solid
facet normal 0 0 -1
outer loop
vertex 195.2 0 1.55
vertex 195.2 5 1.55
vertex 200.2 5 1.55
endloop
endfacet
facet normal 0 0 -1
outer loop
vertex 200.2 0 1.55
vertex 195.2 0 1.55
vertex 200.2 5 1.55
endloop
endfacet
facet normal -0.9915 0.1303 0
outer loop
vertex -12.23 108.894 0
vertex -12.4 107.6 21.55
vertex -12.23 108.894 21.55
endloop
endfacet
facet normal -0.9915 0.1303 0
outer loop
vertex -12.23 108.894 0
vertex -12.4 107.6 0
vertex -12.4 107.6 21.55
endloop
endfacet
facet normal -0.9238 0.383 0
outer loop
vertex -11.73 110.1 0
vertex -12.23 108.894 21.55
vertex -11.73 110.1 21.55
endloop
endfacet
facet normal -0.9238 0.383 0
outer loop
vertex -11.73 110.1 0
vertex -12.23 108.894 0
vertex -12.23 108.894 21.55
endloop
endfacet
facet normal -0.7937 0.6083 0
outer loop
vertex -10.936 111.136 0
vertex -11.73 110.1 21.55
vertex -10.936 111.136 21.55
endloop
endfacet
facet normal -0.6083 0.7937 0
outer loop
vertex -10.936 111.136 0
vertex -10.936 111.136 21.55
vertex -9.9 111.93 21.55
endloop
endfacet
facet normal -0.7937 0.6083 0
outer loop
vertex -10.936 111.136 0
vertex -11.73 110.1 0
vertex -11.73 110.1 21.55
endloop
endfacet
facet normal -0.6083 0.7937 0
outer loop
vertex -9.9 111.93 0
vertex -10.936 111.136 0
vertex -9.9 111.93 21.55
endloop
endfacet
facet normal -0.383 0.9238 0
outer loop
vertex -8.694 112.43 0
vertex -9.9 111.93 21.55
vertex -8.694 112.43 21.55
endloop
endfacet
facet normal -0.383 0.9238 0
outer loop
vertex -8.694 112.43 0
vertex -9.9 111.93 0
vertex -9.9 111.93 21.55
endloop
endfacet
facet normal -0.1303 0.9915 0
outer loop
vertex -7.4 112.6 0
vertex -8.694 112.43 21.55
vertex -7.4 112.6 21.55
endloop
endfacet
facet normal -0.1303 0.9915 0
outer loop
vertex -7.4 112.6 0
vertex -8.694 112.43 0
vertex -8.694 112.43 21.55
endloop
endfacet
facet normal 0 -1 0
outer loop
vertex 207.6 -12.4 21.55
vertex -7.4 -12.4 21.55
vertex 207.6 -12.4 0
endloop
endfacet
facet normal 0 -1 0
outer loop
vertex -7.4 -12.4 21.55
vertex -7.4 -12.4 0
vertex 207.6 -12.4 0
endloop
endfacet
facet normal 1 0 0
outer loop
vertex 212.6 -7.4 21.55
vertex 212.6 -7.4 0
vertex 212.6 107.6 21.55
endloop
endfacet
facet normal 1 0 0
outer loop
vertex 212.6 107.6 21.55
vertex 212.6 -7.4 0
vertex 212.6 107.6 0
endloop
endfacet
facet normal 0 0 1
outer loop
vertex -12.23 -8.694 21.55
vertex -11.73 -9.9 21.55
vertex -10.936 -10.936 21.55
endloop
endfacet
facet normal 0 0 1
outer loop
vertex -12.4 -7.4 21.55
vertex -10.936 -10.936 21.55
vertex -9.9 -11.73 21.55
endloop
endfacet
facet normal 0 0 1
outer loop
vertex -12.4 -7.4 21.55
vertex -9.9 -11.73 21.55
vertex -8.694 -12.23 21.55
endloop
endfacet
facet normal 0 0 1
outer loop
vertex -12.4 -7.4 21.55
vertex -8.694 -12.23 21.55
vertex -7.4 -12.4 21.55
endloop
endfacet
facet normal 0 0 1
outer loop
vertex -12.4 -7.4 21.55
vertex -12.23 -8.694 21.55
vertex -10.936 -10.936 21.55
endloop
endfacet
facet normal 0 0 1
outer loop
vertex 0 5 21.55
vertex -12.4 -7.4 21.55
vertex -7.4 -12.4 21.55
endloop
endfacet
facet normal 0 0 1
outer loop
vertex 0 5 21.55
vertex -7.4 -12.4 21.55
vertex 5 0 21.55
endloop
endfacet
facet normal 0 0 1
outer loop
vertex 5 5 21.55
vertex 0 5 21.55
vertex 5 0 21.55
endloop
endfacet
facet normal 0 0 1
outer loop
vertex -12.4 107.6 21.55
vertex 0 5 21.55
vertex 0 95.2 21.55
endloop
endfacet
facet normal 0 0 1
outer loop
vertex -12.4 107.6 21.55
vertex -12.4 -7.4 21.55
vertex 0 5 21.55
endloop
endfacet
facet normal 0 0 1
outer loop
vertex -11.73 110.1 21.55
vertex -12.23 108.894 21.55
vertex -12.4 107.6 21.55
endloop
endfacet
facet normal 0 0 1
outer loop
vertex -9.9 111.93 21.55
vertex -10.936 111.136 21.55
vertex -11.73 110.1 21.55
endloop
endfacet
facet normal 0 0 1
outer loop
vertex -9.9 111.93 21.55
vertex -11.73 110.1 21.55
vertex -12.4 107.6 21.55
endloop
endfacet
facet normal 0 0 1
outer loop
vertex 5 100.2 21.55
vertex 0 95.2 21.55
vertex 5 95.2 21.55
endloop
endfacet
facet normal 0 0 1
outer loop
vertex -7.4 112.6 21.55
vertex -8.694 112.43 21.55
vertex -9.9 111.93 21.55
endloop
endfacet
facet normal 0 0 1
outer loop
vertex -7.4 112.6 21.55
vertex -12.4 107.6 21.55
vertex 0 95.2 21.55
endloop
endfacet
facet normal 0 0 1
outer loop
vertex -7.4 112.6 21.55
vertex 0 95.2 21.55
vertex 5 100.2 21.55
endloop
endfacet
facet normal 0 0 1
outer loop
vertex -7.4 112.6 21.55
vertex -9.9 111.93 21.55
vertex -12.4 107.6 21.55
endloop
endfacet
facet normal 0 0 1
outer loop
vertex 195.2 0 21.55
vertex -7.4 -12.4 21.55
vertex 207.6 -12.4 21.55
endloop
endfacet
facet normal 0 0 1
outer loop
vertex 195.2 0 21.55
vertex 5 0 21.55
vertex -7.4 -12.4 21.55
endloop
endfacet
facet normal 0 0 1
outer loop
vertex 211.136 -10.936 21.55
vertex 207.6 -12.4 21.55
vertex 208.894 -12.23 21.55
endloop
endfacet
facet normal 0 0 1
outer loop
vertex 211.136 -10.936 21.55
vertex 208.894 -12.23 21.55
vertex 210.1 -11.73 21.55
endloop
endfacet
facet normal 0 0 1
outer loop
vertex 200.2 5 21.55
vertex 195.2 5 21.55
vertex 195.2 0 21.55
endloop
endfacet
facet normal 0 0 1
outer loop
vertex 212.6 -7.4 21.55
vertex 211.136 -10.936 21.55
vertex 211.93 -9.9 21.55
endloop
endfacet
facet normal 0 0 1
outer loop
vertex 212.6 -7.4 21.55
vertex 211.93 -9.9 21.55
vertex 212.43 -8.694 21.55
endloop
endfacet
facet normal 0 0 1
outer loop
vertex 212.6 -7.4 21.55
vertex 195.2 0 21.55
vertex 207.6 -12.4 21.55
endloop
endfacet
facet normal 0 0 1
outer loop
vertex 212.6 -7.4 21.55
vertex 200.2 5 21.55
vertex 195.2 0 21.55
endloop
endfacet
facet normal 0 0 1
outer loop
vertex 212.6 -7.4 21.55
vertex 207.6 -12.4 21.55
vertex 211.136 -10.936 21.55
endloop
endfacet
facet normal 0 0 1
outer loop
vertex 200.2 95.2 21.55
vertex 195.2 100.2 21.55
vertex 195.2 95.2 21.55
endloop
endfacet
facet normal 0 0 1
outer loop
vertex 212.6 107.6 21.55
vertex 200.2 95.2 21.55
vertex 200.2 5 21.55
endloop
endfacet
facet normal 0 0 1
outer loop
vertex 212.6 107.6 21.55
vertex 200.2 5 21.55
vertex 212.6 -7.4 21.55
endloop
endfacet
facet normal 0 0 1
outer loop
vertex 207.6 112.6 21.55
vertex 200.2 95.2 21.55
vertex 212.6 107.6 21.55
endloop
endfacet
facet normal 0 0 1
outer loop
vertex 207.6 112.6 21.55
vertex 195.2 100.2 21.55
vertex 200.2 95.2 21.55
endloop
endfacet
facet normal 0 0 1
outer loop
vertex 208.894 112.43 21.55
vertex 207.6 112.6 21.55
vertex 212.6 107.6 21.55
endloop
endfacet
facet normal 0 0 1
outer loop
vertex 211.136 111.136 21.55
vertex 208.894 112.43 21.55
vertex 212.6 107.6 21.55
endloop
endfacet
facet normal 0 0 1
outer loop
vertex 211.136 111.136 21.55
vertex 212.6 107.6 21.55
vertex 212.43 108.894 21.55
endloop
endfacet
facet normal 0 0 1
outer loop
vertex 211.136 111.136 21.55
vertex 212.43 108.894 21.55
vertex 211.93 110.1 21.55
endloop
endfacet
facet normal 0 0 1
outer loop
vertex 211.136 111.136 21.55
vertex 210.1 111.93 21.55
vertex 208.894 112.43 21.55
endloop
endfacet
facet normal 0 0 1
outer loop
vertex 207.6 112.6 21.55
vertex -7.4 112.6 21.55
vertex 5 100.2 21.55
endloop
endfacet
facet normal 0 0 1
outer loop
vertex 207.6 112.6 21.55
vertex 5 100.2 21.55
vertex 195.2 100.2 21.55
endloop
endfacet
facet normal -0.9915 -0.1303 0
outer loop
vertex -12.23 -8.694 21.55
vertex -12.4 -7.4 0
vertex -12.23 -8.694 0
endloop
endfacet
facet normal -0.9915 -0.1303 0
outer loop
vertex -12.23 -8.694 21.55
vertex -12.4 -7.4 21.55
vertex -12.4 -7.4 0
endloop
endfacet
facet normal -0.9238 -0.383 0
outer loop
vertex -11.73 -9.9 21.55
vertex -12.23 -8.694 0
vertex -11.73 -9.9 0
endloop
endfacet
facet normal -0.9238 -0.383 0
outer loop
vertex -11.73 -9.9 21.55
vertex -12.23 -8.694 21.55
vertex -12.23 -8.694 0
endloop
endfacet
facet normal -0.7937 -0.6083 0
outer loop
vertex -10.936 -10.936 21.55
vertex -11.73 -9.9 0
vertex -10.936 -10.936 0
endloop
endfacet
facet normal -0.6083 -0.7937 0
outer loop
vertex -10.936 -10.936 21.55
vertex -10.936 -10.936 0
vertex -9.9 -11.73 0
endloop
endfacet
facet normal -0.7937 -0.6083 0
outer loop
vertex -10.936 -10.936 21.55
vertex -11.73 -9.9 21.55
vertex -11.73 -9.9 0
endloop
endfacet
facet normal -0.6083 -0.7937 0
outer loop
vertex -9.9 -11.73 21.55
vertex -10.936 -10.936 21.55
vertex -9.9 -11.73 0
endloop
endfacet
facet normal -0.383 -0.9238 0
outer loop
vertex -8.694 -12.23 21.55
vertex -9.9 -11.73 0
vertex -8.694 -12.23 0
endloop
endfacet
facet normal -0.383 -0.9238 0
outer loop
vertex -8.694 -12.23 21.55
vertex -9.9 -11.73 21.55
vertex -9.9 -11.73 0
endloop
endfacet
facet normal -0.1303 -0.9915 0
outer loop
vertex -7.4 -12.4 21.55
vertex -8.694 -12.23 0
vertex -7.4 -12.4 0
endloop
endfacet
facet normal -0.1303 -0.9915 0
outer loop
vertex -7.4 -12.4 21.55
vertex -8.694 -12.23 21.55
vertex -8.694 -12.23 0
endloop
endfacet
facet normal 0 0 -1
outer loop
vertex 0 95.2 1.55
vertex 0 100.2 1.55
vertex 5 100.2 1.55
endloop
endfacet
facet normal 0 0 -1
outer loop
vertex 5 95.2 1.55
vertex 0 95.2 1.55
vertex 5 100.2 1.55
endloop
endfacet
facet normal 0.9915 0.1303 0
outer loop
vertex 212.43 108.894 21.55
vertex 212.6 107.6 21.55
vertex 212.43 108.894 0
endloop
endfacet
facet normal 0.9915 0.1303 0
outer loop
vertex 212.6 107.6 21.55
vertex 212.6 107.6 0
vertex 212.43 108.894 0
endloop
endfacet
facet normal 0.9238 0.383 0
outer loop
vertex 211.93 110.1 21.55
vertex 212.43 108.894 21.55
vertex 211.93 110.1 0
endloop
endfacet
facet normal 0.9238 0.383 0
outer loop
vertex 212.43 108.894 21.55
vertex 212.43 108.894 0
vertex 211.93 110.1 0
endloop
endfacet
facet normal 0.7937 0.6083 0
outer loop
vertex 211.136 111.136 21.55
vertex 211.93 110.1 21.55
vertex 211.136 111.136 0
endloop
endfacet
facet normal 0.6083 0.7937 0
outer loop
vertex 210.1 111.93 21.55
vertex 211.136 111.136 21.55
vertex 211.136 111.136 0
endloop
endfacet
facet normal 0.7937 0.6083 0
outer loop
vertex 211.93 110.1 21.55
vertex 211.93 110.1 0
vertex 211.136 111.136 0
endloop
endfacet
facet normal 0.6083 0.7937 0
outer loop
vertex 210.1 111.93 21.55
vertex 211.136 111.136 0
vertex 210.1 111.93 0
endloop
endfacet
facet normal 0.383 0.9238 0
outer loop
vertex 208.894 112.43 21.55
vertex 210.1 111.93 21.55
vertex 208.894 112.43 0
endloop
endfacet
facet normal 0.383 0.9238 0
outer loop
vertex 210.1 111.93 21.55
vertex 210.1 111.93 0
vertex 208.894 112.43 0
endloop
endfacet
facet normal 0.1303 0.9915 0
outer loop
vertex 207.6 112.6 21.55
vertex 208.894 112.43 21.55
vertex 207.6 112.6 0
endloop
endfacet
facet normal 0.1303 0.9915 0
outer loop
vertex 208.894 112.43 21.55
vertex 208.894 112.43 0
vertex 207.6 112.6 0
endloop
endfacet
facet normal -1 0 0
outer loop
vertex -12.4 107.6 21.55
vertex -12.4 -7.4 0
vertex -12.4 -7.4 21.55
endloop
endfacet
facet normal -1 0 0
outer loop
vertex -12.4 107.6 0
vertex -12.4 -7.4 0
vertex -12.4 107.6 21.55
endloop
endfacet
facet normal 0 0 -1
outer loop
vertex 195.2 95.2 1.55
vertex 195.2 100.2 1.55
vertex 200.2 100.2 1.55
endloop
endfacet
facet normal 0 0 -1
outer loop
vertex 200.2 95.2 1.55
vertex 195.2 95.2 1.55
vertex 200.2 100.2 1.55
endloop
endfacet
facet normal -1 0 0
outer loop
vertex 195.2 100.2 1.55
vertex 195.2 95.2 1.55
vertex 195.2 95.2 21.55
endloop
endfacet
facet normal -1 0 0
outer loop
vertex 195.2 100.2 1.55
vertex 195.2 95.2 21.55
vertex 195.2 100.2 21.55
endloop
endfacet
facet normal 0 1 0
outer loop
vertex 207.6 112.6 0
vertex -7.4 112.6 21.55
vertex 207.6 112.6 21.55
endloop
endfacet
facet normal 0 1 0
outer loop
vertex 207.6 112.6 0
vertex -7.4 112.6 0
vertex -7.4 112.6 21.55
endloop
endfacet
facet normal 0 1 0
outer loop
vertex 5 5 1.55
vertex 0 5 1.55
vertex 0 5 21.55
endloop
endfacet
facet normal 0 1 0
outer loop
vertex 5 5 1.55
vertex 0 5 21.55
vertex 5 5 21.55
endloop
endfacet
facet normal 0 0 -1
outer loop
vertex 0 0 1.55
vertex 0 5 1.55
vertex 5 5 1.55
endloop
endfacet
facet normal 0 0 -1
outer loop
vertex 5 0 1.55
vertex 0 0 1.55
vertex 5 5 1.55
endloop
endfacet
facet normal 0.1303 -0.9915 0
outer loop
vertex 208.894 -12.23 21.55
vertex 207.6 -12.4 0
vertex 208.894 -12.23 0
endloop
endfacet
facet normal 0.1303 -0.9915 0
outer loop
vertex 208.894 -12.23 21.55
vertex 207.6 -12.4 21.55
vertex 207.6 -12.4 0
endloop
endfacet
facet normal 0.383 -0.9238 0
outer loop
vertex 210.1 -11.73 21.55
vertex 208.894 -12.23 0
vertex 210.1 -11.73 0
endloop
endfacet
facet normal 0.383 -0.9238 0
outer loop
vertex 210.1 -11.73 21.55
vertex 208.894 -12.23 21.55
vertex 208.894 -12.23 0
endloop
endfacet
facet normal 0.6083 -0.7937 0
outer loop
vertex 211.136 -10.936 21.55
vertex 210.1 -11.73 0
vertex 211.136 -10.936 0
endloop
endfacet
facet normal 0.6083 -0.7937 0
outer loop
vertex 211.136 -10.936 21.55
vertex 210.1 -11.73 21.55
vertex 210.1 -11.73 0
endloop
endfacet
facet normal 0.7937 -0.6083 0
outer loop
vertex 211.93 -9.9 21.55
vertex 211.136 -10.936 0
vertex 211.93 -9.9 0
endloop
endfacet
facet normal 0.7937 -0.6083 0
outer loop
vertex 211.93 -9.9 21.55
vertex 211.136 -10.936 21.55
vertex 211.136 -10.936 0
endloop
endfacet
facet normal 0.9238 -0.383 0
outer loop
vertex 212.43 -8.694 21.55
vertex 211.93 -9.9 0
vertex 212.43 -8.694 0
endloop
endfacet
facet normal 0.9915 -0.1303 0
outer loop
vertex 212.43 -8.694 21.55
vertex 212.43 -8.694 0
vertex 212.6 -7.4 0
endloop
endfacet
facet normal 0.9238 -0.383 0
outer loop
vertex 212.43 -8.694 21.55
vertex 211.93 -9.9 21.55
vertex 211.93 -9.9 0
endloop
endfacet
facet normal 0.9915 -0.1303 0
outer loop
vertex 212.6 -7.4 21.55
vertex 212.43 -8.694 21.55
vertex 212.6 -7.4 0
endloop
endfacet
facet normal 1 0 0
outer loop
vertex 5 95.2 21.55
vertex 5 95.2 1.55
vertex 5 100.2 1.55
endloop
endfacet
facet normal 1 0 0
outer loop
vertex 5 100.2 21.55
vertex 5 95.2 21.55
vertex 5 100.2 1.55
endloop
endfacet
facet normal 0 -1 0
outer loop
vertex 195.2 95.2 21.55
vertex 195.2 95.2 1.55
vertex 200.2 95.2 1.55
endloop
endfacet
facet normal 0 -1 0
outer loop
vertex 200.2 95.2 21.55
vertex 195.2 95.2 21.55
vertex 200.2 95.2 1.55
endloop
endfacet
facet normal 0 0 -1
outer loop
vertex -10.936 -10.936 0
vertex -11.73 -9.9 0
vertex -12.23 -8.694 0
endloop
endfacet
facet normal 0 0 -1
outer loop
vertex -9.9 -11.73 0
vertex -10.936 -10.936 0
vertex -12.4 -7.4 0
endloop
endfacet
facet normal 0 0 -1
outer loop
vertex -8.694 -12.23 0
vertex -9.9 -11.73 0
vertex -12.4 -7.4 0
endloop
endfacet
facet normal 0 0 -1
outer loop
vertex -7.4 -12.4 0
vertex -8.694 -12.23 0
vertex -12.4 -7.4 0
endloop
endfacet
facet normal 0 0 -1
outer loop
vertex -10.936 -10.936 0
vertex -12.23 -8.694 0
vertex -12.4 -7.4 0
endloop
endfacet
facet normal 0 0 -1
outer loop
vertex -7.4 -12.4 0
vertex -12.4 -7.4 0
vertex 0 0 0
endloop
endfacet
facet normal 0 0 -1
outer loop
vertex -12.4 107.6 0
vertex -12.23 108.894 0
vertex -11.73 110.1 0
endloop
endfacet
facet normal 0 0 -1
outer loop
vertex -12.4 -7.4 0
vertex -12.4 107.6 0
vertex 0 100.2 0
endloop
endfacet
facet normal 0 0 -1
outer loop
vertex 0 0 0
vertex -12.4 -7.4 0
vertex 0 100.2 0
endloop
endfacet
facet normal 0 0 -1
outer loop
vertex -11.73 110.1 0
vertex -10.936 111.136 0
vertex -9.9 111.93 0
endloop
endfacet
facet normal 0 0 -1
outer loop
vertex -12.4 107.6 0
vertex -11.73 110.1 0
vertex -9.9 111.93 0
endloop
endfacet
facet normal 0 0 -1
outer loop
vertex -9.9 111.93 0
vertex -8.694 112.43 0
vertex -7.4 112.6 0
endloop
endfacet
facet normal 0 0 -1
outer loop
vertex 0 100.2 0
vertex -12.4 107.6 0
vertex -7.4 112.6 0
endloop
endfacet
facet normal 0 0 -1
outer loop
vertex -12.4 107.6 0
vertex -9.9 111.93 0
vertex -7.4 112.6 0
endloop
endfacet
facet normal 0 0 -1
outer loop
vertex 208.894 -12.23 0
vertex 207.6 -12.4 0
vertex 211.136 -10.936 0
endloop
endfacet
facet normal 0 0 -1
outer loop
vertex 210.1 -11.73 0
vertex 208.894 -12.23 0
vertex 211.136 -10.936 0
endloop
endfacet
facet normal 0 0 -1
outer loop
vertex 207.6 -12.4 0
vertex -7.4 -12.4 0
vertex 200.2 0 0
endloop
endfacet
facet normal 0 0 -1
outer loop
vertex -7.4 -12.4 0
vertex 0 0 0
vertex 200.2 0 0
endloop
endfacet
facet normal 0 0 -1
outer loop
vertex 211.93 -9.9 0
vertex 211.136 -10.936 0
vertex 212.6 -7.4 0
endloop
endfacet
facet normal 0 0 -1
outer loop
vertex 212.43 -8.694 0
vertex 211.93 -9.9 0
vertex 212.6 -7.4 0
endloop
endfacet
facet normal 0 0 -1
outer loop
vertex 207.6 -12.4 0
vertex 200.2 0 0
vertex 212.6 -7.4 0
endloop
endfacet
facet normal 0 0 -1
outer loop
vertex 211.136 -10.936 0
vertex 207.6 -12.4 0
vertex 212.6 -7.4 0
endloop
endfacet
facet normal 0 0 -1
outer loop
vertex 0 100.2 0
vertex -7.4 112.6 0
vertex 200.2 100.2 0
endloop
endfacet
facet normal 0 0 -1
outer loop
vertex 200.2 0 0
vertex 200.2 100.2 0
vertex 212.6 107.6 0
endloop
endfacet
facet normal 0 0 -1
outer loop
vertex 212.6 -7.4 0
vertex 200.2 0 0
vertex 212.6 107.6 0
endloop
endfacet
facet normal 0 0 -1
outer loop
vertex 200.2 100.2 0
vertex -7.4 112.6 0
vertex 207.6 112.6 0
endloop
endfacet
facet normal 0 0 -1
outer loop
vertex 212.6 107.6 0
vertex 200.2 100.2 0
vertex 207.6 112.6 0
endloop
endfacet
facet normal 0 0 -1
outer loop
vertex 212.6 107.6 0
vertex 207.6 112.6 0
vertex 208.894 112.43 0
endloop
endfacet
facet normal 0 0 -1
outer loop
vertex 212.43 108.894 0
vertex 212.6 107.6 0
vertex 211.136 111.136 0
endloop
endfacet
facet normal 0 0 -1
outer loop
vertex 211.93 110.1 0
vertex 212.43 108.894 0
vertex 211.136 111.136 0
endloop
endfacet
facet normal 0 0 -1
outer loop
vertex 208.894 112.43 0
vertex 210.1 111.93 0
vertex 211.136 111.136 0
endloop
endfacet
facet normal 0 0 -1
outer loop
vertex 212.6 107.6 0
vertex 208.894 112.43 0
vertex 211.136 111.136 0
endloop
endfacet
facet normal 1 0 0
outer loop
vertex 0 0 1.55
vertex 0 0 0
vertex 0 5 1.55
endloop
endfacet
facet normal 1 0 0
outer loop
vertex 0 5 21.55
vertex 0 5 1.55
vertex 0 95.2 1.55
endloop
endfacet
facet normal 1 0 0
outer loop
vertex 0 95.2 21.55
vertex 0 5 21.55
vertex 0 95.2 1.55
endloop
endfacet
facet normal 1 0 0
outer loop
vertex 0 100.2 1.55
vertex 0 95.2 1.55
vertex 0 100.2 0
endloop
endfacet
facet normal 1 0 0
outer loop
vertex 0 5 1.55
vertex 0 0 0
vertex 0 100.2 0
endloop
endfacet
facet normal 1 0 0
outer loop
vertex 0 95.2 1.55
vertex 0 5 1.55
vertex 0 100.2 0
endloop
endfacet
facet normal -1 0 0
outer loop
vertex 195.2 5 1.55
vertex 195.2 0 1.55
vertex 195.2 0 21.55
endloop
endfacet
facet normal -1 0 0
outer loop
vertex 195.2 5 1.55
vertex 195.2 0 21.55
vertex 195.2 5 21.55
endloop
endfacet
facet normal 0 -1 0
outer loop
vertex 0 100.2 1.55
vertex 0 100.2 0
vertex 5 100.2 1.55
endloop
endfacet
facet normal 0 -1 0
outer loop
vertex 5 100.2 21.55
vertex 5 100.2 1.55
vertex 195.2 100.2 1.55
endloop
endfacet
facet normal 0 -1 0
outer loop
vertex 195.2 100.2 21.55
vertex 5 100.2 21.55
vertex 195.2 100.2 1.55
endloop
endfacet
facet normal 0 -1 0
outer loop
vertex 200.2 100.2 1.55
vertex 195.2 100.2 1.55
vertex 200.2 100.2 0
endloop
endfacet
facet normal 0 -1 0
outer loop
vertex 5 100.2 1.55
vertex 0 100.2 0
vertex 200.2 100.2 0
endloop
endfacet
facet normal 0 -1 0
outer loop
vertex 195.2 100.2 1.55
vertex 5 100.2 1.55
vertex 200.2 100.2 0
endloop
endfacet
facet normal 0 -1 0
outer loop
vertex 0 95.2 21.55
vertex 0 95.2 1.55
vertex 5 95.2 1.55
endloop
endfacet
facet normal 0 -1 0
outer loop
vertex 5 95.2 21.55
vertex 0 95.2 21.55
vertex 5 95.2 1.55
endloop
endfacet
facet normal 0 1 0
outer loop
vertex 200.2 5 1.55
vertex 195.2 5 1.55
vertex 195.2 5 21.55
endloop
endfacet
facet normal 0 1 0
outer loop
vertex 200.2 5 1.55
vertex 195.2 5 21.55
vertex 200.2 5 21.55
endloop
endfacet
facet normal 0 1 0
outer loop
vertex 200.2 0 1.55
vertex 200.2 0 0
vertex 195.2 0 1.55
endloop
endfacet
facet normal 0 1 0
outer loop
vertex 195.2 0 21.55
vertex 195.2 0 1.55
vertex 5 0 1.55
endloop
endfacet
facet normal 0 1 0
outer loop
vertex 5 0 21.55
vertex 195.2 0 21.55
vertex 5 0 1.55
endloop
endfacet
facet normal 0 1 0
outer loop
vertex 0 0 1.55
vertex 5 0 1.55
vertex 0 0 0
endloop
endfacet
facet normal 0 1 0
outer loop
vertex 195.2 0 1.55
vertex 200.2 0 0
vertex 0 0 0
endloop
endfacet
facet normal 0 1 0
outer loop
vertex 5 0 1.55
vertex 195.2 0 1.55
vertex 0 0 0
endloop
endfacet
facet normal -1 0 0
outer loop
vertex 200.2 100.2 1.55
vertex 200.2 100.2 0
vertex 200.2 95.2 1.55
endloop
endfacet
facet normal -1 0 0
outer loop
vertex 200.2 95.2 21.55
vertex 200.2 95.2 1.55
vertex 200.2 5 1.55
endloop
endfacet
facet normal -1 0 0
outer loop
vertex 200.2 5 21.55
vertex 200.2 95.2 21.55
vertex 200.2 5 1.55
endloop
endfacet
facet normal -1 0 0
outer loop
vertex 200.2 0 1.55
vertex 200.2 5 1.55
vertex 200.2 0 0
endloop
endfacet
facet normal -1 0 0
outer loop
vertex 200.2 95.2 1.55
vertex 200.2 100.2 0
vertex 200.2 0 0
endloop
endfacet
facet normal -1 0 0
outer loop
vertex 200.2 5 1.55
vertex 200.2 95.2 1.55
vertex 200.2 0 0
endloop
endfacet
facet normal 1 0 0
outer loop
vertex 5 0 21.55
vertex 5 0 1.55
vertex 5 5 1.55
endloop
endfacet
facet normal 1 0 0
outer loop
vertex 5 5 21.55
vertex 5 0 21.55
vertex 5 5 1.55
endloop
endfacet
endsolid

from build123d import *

# Parameters (mm, degrees)
SKETCH1_W           = 225
SKETCH1_H           = 125
SKETCH1_W_2         = 200.2
SKETCH1_H_2         = 100.2
BOSS_EXTRUDE1_DEPTH = 1.55
SKETCH2_W           = 225
SKETCH2_H           = 125
SKETCH2_W_2         = 5
SKETCH2_H_2         = 5
BOSS_EXTRUDE2_DEPTH = 20
FILLET1_R           = 5


with BuildPart() as part:
    # Sketch1 → Boss-Extrude1 (new body)
    with BuildSketch(Plane.XY):
        with Locations((100.1, 50.1)):
            Rectangle(SKETCH1_W, SKETCH1_H)
        with Locations((100.1, 50.1)):
            Rectangle(SKETCH1_W_2, SKETCH1_H_2, mode=Mode.SUBTRACT)
    extrude(amount=BOSS_EXTRUDE1_DEPTH)

    # Sketch2 → Boss-Extrude2 (add)
    # profile 1 of 5: a face of its own
    with BuildSketch(Plane.XY.offset(1.55)):
        with Locations((100.1, 50.1)):
            Rectangle(SKETCH2_W, SKETCH2_H)
        Polygon((0, 95.2), (0, 100.2), (5, 100.2), (195.2, 100.2), (200.2, 100.2), (200.2, 95.2), (200.2, 5), (200.2, 0), (195.2, 0), (5, 0), (0, 0), (0, 5), align=None, mode=Mode.SUBTRACT)
    # profile 2 of 5: a face of its own
    with BuildSketch(Plane.XY.offset(1.55)):
        with Locations((197.7, 97.7)):
            Rectangle(SKETCH2_W_2, SKETCH2_H_2)
    # profile 3 of 5: a face of its own
    with BuildSketch(Plane.XY.offset(1.55)):
        with Locations((197.7, 2.5)):
            Rectangle(SKETCH2_W_2, SKETCH2_H_2)
    # profile 4 of 5: a face of its own
    with BuildSketch(Plane.XY.offset(1.55)):
        with Locations((2.5, 2.5)):
            Rectangle(SKETCH2_W_2, SKETCH2_H_2)
    # profile 5 of 5: a face of its own
    with BuildSketch(Plane.XY.offset(1.55)):
        with Locations((2.5, 97.7)):
            Rectangle(SKETCH2_W_2, SKETCH2_H_2)
    extrude(amount=BOSS_EXTRUDE2_DEPTH)

    # Fillet1
    fillet1_edges = [part.edges().sort_by_distance(p)[0] for p in [
        (-12.4, 112.6, 10.775),
        (212.6, 112.6, 10.775),
        (212.6, -12.4, 10.775),
        (-12.4, -12.4, 10.775),
    ]]
    fillet(fillet1_edges, radius=FILLET1_R)


solid = part.part
